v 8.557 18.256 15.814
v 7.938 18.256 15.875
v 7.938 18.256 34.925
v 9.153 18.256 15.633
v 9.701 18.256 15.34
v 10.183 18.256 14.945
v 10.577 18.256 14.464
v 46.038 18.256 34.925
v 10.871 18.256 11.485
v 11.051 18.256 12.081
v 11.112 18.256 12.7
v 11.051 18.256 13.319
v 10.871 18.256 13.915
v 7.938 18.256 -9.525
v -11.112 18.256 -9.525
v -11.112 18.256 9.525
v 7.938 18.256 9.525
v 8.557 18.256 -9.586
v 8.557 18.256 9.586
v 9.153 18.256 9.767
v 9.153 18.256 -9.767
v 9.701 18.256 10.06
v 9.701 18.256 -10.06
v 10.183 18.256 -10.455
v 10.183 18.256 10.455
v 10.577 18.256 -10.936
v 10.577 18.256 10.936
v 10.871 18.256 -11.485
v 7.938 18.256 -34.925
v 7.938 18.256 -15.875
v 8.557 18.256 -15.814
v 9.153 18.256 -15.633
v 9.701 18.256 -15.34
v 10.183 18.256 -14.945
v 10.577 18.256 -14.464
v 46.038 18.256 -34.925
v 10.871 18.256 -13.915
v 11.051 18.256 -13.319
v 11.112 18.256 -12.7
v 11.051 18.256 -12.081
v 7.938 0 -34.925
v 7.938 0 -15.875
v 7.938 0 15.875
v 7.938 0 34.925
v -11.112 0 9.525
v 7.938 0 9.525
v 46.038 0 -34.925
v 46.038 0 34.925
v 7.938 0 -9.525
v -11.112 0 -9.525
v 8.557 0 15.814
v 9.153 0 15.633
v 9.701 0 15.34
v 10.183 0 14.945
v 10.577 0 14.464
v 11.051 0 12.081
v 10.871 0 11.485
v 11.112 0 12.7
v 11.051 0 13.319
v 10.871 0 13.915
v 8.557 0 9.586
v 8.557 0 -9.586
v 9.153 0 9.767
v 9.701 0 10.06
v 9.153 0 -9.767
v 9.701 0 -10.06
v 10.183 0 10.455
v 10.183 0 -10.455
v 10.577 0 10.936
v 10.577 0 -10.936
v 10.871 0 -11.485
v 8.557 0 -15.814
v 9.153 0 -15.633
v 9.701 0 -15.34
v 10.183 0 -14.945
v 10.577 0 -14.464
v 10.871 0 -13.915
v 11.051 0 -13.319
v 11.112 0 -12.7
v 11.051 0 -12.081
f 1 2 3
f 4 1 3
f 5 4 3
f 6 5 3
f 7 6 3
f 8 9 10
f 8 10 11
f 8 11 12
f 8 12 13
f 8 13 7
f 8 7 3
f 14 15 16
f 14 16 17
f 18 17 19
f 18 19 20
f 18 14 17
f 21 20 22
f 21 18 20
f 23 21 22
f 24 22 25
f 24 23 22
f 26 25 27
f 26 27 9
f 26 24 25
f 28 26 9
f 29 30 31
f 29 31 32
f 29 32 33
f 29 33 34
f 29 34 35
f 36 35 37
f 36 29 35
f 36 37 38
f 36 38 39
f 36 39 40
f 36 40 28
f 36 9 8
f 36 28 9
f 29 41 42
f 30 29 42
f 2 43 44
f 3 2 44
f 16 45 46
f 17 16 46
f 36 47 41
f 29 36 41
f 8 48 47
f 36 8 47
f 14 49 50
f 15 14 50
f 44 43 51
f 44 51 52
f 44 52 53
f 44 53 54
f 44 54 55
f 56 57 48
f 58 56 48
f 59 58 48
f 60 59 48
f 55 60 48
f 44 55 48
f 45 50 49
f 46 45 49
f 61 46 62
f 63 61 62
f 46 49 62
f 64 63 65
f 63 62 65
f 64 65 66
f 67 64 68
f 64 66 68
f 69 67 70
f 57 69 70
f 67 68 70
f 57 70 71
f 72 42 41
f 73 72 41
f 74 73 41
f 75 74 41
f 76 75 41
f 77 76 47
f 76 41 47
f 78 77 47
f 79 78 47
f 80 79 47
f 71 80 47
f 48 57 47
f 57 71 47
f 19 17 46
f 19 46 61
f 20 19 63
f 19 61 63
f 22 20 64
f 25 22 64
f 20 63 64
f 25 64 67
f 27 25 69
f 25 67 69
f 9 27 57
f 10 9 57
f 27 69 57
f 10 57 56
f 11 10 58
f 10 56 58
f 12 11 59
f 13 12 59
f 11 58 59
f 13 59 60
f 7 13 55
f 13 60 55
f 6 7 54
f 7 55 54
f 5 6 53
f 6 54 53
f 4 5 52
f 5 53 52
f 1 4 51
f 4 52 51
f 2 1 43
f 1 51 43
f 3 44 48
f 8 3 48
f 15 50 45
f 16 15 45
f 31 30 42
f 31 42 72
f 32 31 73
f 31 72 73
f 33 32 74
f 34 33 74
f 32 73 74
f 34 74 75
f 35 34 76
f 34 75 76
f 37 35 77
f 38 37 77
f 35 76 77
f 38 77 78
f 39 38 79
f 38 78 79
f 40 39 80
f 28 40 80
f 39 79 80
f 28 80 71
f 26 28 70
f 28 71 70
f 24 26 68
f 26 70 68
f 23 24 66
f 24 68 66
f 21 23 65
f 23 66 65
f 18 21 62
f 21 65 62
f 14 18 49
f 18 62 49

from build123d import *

# Parameters (mm, degrees)
BOSS_EXTRUDE1_DEPTH = 18.25625


with BuildPart() as part:
    # Sketch1 → Boss-Extrude1 (new body)
    with BuildSketch(Plane(origin=(0, 0, 0), x_dir=(1, 0, 0), z_dir=(0, 1, 0))):
        with BuildLine():
            Line((7.9375, 34.925), (7.9375, 15.875))
            ThreePointArc((7.9375, 15.875), (11.1125, 12.7), (7.9375, 9.525))
            Line((7.9375, 9.525), (-11.1125, 9.525))
            Line((-11.1125, 9.525), (-11.1125, -9.525))
            Line((-11.1125, -9.525), (7.9375, -9.525))
            ThreePointArc((7.9375, -9.525), (11.1125, -12.7), (7.9375, -15.875))
            Line((7.9375, -15.875), (7.9375, -34.925))
            Line((7.9375, -34.925), (46.0375, -34.925))
            Line((46.0375, -34.925), (46.0375, 34.925))
            Line((46.0375, 34.925), (7.9375, 34.925))
        make_face()
    extrude(amount=BOSS_EXTRUDE1_DEPTH)


solid = part.part
